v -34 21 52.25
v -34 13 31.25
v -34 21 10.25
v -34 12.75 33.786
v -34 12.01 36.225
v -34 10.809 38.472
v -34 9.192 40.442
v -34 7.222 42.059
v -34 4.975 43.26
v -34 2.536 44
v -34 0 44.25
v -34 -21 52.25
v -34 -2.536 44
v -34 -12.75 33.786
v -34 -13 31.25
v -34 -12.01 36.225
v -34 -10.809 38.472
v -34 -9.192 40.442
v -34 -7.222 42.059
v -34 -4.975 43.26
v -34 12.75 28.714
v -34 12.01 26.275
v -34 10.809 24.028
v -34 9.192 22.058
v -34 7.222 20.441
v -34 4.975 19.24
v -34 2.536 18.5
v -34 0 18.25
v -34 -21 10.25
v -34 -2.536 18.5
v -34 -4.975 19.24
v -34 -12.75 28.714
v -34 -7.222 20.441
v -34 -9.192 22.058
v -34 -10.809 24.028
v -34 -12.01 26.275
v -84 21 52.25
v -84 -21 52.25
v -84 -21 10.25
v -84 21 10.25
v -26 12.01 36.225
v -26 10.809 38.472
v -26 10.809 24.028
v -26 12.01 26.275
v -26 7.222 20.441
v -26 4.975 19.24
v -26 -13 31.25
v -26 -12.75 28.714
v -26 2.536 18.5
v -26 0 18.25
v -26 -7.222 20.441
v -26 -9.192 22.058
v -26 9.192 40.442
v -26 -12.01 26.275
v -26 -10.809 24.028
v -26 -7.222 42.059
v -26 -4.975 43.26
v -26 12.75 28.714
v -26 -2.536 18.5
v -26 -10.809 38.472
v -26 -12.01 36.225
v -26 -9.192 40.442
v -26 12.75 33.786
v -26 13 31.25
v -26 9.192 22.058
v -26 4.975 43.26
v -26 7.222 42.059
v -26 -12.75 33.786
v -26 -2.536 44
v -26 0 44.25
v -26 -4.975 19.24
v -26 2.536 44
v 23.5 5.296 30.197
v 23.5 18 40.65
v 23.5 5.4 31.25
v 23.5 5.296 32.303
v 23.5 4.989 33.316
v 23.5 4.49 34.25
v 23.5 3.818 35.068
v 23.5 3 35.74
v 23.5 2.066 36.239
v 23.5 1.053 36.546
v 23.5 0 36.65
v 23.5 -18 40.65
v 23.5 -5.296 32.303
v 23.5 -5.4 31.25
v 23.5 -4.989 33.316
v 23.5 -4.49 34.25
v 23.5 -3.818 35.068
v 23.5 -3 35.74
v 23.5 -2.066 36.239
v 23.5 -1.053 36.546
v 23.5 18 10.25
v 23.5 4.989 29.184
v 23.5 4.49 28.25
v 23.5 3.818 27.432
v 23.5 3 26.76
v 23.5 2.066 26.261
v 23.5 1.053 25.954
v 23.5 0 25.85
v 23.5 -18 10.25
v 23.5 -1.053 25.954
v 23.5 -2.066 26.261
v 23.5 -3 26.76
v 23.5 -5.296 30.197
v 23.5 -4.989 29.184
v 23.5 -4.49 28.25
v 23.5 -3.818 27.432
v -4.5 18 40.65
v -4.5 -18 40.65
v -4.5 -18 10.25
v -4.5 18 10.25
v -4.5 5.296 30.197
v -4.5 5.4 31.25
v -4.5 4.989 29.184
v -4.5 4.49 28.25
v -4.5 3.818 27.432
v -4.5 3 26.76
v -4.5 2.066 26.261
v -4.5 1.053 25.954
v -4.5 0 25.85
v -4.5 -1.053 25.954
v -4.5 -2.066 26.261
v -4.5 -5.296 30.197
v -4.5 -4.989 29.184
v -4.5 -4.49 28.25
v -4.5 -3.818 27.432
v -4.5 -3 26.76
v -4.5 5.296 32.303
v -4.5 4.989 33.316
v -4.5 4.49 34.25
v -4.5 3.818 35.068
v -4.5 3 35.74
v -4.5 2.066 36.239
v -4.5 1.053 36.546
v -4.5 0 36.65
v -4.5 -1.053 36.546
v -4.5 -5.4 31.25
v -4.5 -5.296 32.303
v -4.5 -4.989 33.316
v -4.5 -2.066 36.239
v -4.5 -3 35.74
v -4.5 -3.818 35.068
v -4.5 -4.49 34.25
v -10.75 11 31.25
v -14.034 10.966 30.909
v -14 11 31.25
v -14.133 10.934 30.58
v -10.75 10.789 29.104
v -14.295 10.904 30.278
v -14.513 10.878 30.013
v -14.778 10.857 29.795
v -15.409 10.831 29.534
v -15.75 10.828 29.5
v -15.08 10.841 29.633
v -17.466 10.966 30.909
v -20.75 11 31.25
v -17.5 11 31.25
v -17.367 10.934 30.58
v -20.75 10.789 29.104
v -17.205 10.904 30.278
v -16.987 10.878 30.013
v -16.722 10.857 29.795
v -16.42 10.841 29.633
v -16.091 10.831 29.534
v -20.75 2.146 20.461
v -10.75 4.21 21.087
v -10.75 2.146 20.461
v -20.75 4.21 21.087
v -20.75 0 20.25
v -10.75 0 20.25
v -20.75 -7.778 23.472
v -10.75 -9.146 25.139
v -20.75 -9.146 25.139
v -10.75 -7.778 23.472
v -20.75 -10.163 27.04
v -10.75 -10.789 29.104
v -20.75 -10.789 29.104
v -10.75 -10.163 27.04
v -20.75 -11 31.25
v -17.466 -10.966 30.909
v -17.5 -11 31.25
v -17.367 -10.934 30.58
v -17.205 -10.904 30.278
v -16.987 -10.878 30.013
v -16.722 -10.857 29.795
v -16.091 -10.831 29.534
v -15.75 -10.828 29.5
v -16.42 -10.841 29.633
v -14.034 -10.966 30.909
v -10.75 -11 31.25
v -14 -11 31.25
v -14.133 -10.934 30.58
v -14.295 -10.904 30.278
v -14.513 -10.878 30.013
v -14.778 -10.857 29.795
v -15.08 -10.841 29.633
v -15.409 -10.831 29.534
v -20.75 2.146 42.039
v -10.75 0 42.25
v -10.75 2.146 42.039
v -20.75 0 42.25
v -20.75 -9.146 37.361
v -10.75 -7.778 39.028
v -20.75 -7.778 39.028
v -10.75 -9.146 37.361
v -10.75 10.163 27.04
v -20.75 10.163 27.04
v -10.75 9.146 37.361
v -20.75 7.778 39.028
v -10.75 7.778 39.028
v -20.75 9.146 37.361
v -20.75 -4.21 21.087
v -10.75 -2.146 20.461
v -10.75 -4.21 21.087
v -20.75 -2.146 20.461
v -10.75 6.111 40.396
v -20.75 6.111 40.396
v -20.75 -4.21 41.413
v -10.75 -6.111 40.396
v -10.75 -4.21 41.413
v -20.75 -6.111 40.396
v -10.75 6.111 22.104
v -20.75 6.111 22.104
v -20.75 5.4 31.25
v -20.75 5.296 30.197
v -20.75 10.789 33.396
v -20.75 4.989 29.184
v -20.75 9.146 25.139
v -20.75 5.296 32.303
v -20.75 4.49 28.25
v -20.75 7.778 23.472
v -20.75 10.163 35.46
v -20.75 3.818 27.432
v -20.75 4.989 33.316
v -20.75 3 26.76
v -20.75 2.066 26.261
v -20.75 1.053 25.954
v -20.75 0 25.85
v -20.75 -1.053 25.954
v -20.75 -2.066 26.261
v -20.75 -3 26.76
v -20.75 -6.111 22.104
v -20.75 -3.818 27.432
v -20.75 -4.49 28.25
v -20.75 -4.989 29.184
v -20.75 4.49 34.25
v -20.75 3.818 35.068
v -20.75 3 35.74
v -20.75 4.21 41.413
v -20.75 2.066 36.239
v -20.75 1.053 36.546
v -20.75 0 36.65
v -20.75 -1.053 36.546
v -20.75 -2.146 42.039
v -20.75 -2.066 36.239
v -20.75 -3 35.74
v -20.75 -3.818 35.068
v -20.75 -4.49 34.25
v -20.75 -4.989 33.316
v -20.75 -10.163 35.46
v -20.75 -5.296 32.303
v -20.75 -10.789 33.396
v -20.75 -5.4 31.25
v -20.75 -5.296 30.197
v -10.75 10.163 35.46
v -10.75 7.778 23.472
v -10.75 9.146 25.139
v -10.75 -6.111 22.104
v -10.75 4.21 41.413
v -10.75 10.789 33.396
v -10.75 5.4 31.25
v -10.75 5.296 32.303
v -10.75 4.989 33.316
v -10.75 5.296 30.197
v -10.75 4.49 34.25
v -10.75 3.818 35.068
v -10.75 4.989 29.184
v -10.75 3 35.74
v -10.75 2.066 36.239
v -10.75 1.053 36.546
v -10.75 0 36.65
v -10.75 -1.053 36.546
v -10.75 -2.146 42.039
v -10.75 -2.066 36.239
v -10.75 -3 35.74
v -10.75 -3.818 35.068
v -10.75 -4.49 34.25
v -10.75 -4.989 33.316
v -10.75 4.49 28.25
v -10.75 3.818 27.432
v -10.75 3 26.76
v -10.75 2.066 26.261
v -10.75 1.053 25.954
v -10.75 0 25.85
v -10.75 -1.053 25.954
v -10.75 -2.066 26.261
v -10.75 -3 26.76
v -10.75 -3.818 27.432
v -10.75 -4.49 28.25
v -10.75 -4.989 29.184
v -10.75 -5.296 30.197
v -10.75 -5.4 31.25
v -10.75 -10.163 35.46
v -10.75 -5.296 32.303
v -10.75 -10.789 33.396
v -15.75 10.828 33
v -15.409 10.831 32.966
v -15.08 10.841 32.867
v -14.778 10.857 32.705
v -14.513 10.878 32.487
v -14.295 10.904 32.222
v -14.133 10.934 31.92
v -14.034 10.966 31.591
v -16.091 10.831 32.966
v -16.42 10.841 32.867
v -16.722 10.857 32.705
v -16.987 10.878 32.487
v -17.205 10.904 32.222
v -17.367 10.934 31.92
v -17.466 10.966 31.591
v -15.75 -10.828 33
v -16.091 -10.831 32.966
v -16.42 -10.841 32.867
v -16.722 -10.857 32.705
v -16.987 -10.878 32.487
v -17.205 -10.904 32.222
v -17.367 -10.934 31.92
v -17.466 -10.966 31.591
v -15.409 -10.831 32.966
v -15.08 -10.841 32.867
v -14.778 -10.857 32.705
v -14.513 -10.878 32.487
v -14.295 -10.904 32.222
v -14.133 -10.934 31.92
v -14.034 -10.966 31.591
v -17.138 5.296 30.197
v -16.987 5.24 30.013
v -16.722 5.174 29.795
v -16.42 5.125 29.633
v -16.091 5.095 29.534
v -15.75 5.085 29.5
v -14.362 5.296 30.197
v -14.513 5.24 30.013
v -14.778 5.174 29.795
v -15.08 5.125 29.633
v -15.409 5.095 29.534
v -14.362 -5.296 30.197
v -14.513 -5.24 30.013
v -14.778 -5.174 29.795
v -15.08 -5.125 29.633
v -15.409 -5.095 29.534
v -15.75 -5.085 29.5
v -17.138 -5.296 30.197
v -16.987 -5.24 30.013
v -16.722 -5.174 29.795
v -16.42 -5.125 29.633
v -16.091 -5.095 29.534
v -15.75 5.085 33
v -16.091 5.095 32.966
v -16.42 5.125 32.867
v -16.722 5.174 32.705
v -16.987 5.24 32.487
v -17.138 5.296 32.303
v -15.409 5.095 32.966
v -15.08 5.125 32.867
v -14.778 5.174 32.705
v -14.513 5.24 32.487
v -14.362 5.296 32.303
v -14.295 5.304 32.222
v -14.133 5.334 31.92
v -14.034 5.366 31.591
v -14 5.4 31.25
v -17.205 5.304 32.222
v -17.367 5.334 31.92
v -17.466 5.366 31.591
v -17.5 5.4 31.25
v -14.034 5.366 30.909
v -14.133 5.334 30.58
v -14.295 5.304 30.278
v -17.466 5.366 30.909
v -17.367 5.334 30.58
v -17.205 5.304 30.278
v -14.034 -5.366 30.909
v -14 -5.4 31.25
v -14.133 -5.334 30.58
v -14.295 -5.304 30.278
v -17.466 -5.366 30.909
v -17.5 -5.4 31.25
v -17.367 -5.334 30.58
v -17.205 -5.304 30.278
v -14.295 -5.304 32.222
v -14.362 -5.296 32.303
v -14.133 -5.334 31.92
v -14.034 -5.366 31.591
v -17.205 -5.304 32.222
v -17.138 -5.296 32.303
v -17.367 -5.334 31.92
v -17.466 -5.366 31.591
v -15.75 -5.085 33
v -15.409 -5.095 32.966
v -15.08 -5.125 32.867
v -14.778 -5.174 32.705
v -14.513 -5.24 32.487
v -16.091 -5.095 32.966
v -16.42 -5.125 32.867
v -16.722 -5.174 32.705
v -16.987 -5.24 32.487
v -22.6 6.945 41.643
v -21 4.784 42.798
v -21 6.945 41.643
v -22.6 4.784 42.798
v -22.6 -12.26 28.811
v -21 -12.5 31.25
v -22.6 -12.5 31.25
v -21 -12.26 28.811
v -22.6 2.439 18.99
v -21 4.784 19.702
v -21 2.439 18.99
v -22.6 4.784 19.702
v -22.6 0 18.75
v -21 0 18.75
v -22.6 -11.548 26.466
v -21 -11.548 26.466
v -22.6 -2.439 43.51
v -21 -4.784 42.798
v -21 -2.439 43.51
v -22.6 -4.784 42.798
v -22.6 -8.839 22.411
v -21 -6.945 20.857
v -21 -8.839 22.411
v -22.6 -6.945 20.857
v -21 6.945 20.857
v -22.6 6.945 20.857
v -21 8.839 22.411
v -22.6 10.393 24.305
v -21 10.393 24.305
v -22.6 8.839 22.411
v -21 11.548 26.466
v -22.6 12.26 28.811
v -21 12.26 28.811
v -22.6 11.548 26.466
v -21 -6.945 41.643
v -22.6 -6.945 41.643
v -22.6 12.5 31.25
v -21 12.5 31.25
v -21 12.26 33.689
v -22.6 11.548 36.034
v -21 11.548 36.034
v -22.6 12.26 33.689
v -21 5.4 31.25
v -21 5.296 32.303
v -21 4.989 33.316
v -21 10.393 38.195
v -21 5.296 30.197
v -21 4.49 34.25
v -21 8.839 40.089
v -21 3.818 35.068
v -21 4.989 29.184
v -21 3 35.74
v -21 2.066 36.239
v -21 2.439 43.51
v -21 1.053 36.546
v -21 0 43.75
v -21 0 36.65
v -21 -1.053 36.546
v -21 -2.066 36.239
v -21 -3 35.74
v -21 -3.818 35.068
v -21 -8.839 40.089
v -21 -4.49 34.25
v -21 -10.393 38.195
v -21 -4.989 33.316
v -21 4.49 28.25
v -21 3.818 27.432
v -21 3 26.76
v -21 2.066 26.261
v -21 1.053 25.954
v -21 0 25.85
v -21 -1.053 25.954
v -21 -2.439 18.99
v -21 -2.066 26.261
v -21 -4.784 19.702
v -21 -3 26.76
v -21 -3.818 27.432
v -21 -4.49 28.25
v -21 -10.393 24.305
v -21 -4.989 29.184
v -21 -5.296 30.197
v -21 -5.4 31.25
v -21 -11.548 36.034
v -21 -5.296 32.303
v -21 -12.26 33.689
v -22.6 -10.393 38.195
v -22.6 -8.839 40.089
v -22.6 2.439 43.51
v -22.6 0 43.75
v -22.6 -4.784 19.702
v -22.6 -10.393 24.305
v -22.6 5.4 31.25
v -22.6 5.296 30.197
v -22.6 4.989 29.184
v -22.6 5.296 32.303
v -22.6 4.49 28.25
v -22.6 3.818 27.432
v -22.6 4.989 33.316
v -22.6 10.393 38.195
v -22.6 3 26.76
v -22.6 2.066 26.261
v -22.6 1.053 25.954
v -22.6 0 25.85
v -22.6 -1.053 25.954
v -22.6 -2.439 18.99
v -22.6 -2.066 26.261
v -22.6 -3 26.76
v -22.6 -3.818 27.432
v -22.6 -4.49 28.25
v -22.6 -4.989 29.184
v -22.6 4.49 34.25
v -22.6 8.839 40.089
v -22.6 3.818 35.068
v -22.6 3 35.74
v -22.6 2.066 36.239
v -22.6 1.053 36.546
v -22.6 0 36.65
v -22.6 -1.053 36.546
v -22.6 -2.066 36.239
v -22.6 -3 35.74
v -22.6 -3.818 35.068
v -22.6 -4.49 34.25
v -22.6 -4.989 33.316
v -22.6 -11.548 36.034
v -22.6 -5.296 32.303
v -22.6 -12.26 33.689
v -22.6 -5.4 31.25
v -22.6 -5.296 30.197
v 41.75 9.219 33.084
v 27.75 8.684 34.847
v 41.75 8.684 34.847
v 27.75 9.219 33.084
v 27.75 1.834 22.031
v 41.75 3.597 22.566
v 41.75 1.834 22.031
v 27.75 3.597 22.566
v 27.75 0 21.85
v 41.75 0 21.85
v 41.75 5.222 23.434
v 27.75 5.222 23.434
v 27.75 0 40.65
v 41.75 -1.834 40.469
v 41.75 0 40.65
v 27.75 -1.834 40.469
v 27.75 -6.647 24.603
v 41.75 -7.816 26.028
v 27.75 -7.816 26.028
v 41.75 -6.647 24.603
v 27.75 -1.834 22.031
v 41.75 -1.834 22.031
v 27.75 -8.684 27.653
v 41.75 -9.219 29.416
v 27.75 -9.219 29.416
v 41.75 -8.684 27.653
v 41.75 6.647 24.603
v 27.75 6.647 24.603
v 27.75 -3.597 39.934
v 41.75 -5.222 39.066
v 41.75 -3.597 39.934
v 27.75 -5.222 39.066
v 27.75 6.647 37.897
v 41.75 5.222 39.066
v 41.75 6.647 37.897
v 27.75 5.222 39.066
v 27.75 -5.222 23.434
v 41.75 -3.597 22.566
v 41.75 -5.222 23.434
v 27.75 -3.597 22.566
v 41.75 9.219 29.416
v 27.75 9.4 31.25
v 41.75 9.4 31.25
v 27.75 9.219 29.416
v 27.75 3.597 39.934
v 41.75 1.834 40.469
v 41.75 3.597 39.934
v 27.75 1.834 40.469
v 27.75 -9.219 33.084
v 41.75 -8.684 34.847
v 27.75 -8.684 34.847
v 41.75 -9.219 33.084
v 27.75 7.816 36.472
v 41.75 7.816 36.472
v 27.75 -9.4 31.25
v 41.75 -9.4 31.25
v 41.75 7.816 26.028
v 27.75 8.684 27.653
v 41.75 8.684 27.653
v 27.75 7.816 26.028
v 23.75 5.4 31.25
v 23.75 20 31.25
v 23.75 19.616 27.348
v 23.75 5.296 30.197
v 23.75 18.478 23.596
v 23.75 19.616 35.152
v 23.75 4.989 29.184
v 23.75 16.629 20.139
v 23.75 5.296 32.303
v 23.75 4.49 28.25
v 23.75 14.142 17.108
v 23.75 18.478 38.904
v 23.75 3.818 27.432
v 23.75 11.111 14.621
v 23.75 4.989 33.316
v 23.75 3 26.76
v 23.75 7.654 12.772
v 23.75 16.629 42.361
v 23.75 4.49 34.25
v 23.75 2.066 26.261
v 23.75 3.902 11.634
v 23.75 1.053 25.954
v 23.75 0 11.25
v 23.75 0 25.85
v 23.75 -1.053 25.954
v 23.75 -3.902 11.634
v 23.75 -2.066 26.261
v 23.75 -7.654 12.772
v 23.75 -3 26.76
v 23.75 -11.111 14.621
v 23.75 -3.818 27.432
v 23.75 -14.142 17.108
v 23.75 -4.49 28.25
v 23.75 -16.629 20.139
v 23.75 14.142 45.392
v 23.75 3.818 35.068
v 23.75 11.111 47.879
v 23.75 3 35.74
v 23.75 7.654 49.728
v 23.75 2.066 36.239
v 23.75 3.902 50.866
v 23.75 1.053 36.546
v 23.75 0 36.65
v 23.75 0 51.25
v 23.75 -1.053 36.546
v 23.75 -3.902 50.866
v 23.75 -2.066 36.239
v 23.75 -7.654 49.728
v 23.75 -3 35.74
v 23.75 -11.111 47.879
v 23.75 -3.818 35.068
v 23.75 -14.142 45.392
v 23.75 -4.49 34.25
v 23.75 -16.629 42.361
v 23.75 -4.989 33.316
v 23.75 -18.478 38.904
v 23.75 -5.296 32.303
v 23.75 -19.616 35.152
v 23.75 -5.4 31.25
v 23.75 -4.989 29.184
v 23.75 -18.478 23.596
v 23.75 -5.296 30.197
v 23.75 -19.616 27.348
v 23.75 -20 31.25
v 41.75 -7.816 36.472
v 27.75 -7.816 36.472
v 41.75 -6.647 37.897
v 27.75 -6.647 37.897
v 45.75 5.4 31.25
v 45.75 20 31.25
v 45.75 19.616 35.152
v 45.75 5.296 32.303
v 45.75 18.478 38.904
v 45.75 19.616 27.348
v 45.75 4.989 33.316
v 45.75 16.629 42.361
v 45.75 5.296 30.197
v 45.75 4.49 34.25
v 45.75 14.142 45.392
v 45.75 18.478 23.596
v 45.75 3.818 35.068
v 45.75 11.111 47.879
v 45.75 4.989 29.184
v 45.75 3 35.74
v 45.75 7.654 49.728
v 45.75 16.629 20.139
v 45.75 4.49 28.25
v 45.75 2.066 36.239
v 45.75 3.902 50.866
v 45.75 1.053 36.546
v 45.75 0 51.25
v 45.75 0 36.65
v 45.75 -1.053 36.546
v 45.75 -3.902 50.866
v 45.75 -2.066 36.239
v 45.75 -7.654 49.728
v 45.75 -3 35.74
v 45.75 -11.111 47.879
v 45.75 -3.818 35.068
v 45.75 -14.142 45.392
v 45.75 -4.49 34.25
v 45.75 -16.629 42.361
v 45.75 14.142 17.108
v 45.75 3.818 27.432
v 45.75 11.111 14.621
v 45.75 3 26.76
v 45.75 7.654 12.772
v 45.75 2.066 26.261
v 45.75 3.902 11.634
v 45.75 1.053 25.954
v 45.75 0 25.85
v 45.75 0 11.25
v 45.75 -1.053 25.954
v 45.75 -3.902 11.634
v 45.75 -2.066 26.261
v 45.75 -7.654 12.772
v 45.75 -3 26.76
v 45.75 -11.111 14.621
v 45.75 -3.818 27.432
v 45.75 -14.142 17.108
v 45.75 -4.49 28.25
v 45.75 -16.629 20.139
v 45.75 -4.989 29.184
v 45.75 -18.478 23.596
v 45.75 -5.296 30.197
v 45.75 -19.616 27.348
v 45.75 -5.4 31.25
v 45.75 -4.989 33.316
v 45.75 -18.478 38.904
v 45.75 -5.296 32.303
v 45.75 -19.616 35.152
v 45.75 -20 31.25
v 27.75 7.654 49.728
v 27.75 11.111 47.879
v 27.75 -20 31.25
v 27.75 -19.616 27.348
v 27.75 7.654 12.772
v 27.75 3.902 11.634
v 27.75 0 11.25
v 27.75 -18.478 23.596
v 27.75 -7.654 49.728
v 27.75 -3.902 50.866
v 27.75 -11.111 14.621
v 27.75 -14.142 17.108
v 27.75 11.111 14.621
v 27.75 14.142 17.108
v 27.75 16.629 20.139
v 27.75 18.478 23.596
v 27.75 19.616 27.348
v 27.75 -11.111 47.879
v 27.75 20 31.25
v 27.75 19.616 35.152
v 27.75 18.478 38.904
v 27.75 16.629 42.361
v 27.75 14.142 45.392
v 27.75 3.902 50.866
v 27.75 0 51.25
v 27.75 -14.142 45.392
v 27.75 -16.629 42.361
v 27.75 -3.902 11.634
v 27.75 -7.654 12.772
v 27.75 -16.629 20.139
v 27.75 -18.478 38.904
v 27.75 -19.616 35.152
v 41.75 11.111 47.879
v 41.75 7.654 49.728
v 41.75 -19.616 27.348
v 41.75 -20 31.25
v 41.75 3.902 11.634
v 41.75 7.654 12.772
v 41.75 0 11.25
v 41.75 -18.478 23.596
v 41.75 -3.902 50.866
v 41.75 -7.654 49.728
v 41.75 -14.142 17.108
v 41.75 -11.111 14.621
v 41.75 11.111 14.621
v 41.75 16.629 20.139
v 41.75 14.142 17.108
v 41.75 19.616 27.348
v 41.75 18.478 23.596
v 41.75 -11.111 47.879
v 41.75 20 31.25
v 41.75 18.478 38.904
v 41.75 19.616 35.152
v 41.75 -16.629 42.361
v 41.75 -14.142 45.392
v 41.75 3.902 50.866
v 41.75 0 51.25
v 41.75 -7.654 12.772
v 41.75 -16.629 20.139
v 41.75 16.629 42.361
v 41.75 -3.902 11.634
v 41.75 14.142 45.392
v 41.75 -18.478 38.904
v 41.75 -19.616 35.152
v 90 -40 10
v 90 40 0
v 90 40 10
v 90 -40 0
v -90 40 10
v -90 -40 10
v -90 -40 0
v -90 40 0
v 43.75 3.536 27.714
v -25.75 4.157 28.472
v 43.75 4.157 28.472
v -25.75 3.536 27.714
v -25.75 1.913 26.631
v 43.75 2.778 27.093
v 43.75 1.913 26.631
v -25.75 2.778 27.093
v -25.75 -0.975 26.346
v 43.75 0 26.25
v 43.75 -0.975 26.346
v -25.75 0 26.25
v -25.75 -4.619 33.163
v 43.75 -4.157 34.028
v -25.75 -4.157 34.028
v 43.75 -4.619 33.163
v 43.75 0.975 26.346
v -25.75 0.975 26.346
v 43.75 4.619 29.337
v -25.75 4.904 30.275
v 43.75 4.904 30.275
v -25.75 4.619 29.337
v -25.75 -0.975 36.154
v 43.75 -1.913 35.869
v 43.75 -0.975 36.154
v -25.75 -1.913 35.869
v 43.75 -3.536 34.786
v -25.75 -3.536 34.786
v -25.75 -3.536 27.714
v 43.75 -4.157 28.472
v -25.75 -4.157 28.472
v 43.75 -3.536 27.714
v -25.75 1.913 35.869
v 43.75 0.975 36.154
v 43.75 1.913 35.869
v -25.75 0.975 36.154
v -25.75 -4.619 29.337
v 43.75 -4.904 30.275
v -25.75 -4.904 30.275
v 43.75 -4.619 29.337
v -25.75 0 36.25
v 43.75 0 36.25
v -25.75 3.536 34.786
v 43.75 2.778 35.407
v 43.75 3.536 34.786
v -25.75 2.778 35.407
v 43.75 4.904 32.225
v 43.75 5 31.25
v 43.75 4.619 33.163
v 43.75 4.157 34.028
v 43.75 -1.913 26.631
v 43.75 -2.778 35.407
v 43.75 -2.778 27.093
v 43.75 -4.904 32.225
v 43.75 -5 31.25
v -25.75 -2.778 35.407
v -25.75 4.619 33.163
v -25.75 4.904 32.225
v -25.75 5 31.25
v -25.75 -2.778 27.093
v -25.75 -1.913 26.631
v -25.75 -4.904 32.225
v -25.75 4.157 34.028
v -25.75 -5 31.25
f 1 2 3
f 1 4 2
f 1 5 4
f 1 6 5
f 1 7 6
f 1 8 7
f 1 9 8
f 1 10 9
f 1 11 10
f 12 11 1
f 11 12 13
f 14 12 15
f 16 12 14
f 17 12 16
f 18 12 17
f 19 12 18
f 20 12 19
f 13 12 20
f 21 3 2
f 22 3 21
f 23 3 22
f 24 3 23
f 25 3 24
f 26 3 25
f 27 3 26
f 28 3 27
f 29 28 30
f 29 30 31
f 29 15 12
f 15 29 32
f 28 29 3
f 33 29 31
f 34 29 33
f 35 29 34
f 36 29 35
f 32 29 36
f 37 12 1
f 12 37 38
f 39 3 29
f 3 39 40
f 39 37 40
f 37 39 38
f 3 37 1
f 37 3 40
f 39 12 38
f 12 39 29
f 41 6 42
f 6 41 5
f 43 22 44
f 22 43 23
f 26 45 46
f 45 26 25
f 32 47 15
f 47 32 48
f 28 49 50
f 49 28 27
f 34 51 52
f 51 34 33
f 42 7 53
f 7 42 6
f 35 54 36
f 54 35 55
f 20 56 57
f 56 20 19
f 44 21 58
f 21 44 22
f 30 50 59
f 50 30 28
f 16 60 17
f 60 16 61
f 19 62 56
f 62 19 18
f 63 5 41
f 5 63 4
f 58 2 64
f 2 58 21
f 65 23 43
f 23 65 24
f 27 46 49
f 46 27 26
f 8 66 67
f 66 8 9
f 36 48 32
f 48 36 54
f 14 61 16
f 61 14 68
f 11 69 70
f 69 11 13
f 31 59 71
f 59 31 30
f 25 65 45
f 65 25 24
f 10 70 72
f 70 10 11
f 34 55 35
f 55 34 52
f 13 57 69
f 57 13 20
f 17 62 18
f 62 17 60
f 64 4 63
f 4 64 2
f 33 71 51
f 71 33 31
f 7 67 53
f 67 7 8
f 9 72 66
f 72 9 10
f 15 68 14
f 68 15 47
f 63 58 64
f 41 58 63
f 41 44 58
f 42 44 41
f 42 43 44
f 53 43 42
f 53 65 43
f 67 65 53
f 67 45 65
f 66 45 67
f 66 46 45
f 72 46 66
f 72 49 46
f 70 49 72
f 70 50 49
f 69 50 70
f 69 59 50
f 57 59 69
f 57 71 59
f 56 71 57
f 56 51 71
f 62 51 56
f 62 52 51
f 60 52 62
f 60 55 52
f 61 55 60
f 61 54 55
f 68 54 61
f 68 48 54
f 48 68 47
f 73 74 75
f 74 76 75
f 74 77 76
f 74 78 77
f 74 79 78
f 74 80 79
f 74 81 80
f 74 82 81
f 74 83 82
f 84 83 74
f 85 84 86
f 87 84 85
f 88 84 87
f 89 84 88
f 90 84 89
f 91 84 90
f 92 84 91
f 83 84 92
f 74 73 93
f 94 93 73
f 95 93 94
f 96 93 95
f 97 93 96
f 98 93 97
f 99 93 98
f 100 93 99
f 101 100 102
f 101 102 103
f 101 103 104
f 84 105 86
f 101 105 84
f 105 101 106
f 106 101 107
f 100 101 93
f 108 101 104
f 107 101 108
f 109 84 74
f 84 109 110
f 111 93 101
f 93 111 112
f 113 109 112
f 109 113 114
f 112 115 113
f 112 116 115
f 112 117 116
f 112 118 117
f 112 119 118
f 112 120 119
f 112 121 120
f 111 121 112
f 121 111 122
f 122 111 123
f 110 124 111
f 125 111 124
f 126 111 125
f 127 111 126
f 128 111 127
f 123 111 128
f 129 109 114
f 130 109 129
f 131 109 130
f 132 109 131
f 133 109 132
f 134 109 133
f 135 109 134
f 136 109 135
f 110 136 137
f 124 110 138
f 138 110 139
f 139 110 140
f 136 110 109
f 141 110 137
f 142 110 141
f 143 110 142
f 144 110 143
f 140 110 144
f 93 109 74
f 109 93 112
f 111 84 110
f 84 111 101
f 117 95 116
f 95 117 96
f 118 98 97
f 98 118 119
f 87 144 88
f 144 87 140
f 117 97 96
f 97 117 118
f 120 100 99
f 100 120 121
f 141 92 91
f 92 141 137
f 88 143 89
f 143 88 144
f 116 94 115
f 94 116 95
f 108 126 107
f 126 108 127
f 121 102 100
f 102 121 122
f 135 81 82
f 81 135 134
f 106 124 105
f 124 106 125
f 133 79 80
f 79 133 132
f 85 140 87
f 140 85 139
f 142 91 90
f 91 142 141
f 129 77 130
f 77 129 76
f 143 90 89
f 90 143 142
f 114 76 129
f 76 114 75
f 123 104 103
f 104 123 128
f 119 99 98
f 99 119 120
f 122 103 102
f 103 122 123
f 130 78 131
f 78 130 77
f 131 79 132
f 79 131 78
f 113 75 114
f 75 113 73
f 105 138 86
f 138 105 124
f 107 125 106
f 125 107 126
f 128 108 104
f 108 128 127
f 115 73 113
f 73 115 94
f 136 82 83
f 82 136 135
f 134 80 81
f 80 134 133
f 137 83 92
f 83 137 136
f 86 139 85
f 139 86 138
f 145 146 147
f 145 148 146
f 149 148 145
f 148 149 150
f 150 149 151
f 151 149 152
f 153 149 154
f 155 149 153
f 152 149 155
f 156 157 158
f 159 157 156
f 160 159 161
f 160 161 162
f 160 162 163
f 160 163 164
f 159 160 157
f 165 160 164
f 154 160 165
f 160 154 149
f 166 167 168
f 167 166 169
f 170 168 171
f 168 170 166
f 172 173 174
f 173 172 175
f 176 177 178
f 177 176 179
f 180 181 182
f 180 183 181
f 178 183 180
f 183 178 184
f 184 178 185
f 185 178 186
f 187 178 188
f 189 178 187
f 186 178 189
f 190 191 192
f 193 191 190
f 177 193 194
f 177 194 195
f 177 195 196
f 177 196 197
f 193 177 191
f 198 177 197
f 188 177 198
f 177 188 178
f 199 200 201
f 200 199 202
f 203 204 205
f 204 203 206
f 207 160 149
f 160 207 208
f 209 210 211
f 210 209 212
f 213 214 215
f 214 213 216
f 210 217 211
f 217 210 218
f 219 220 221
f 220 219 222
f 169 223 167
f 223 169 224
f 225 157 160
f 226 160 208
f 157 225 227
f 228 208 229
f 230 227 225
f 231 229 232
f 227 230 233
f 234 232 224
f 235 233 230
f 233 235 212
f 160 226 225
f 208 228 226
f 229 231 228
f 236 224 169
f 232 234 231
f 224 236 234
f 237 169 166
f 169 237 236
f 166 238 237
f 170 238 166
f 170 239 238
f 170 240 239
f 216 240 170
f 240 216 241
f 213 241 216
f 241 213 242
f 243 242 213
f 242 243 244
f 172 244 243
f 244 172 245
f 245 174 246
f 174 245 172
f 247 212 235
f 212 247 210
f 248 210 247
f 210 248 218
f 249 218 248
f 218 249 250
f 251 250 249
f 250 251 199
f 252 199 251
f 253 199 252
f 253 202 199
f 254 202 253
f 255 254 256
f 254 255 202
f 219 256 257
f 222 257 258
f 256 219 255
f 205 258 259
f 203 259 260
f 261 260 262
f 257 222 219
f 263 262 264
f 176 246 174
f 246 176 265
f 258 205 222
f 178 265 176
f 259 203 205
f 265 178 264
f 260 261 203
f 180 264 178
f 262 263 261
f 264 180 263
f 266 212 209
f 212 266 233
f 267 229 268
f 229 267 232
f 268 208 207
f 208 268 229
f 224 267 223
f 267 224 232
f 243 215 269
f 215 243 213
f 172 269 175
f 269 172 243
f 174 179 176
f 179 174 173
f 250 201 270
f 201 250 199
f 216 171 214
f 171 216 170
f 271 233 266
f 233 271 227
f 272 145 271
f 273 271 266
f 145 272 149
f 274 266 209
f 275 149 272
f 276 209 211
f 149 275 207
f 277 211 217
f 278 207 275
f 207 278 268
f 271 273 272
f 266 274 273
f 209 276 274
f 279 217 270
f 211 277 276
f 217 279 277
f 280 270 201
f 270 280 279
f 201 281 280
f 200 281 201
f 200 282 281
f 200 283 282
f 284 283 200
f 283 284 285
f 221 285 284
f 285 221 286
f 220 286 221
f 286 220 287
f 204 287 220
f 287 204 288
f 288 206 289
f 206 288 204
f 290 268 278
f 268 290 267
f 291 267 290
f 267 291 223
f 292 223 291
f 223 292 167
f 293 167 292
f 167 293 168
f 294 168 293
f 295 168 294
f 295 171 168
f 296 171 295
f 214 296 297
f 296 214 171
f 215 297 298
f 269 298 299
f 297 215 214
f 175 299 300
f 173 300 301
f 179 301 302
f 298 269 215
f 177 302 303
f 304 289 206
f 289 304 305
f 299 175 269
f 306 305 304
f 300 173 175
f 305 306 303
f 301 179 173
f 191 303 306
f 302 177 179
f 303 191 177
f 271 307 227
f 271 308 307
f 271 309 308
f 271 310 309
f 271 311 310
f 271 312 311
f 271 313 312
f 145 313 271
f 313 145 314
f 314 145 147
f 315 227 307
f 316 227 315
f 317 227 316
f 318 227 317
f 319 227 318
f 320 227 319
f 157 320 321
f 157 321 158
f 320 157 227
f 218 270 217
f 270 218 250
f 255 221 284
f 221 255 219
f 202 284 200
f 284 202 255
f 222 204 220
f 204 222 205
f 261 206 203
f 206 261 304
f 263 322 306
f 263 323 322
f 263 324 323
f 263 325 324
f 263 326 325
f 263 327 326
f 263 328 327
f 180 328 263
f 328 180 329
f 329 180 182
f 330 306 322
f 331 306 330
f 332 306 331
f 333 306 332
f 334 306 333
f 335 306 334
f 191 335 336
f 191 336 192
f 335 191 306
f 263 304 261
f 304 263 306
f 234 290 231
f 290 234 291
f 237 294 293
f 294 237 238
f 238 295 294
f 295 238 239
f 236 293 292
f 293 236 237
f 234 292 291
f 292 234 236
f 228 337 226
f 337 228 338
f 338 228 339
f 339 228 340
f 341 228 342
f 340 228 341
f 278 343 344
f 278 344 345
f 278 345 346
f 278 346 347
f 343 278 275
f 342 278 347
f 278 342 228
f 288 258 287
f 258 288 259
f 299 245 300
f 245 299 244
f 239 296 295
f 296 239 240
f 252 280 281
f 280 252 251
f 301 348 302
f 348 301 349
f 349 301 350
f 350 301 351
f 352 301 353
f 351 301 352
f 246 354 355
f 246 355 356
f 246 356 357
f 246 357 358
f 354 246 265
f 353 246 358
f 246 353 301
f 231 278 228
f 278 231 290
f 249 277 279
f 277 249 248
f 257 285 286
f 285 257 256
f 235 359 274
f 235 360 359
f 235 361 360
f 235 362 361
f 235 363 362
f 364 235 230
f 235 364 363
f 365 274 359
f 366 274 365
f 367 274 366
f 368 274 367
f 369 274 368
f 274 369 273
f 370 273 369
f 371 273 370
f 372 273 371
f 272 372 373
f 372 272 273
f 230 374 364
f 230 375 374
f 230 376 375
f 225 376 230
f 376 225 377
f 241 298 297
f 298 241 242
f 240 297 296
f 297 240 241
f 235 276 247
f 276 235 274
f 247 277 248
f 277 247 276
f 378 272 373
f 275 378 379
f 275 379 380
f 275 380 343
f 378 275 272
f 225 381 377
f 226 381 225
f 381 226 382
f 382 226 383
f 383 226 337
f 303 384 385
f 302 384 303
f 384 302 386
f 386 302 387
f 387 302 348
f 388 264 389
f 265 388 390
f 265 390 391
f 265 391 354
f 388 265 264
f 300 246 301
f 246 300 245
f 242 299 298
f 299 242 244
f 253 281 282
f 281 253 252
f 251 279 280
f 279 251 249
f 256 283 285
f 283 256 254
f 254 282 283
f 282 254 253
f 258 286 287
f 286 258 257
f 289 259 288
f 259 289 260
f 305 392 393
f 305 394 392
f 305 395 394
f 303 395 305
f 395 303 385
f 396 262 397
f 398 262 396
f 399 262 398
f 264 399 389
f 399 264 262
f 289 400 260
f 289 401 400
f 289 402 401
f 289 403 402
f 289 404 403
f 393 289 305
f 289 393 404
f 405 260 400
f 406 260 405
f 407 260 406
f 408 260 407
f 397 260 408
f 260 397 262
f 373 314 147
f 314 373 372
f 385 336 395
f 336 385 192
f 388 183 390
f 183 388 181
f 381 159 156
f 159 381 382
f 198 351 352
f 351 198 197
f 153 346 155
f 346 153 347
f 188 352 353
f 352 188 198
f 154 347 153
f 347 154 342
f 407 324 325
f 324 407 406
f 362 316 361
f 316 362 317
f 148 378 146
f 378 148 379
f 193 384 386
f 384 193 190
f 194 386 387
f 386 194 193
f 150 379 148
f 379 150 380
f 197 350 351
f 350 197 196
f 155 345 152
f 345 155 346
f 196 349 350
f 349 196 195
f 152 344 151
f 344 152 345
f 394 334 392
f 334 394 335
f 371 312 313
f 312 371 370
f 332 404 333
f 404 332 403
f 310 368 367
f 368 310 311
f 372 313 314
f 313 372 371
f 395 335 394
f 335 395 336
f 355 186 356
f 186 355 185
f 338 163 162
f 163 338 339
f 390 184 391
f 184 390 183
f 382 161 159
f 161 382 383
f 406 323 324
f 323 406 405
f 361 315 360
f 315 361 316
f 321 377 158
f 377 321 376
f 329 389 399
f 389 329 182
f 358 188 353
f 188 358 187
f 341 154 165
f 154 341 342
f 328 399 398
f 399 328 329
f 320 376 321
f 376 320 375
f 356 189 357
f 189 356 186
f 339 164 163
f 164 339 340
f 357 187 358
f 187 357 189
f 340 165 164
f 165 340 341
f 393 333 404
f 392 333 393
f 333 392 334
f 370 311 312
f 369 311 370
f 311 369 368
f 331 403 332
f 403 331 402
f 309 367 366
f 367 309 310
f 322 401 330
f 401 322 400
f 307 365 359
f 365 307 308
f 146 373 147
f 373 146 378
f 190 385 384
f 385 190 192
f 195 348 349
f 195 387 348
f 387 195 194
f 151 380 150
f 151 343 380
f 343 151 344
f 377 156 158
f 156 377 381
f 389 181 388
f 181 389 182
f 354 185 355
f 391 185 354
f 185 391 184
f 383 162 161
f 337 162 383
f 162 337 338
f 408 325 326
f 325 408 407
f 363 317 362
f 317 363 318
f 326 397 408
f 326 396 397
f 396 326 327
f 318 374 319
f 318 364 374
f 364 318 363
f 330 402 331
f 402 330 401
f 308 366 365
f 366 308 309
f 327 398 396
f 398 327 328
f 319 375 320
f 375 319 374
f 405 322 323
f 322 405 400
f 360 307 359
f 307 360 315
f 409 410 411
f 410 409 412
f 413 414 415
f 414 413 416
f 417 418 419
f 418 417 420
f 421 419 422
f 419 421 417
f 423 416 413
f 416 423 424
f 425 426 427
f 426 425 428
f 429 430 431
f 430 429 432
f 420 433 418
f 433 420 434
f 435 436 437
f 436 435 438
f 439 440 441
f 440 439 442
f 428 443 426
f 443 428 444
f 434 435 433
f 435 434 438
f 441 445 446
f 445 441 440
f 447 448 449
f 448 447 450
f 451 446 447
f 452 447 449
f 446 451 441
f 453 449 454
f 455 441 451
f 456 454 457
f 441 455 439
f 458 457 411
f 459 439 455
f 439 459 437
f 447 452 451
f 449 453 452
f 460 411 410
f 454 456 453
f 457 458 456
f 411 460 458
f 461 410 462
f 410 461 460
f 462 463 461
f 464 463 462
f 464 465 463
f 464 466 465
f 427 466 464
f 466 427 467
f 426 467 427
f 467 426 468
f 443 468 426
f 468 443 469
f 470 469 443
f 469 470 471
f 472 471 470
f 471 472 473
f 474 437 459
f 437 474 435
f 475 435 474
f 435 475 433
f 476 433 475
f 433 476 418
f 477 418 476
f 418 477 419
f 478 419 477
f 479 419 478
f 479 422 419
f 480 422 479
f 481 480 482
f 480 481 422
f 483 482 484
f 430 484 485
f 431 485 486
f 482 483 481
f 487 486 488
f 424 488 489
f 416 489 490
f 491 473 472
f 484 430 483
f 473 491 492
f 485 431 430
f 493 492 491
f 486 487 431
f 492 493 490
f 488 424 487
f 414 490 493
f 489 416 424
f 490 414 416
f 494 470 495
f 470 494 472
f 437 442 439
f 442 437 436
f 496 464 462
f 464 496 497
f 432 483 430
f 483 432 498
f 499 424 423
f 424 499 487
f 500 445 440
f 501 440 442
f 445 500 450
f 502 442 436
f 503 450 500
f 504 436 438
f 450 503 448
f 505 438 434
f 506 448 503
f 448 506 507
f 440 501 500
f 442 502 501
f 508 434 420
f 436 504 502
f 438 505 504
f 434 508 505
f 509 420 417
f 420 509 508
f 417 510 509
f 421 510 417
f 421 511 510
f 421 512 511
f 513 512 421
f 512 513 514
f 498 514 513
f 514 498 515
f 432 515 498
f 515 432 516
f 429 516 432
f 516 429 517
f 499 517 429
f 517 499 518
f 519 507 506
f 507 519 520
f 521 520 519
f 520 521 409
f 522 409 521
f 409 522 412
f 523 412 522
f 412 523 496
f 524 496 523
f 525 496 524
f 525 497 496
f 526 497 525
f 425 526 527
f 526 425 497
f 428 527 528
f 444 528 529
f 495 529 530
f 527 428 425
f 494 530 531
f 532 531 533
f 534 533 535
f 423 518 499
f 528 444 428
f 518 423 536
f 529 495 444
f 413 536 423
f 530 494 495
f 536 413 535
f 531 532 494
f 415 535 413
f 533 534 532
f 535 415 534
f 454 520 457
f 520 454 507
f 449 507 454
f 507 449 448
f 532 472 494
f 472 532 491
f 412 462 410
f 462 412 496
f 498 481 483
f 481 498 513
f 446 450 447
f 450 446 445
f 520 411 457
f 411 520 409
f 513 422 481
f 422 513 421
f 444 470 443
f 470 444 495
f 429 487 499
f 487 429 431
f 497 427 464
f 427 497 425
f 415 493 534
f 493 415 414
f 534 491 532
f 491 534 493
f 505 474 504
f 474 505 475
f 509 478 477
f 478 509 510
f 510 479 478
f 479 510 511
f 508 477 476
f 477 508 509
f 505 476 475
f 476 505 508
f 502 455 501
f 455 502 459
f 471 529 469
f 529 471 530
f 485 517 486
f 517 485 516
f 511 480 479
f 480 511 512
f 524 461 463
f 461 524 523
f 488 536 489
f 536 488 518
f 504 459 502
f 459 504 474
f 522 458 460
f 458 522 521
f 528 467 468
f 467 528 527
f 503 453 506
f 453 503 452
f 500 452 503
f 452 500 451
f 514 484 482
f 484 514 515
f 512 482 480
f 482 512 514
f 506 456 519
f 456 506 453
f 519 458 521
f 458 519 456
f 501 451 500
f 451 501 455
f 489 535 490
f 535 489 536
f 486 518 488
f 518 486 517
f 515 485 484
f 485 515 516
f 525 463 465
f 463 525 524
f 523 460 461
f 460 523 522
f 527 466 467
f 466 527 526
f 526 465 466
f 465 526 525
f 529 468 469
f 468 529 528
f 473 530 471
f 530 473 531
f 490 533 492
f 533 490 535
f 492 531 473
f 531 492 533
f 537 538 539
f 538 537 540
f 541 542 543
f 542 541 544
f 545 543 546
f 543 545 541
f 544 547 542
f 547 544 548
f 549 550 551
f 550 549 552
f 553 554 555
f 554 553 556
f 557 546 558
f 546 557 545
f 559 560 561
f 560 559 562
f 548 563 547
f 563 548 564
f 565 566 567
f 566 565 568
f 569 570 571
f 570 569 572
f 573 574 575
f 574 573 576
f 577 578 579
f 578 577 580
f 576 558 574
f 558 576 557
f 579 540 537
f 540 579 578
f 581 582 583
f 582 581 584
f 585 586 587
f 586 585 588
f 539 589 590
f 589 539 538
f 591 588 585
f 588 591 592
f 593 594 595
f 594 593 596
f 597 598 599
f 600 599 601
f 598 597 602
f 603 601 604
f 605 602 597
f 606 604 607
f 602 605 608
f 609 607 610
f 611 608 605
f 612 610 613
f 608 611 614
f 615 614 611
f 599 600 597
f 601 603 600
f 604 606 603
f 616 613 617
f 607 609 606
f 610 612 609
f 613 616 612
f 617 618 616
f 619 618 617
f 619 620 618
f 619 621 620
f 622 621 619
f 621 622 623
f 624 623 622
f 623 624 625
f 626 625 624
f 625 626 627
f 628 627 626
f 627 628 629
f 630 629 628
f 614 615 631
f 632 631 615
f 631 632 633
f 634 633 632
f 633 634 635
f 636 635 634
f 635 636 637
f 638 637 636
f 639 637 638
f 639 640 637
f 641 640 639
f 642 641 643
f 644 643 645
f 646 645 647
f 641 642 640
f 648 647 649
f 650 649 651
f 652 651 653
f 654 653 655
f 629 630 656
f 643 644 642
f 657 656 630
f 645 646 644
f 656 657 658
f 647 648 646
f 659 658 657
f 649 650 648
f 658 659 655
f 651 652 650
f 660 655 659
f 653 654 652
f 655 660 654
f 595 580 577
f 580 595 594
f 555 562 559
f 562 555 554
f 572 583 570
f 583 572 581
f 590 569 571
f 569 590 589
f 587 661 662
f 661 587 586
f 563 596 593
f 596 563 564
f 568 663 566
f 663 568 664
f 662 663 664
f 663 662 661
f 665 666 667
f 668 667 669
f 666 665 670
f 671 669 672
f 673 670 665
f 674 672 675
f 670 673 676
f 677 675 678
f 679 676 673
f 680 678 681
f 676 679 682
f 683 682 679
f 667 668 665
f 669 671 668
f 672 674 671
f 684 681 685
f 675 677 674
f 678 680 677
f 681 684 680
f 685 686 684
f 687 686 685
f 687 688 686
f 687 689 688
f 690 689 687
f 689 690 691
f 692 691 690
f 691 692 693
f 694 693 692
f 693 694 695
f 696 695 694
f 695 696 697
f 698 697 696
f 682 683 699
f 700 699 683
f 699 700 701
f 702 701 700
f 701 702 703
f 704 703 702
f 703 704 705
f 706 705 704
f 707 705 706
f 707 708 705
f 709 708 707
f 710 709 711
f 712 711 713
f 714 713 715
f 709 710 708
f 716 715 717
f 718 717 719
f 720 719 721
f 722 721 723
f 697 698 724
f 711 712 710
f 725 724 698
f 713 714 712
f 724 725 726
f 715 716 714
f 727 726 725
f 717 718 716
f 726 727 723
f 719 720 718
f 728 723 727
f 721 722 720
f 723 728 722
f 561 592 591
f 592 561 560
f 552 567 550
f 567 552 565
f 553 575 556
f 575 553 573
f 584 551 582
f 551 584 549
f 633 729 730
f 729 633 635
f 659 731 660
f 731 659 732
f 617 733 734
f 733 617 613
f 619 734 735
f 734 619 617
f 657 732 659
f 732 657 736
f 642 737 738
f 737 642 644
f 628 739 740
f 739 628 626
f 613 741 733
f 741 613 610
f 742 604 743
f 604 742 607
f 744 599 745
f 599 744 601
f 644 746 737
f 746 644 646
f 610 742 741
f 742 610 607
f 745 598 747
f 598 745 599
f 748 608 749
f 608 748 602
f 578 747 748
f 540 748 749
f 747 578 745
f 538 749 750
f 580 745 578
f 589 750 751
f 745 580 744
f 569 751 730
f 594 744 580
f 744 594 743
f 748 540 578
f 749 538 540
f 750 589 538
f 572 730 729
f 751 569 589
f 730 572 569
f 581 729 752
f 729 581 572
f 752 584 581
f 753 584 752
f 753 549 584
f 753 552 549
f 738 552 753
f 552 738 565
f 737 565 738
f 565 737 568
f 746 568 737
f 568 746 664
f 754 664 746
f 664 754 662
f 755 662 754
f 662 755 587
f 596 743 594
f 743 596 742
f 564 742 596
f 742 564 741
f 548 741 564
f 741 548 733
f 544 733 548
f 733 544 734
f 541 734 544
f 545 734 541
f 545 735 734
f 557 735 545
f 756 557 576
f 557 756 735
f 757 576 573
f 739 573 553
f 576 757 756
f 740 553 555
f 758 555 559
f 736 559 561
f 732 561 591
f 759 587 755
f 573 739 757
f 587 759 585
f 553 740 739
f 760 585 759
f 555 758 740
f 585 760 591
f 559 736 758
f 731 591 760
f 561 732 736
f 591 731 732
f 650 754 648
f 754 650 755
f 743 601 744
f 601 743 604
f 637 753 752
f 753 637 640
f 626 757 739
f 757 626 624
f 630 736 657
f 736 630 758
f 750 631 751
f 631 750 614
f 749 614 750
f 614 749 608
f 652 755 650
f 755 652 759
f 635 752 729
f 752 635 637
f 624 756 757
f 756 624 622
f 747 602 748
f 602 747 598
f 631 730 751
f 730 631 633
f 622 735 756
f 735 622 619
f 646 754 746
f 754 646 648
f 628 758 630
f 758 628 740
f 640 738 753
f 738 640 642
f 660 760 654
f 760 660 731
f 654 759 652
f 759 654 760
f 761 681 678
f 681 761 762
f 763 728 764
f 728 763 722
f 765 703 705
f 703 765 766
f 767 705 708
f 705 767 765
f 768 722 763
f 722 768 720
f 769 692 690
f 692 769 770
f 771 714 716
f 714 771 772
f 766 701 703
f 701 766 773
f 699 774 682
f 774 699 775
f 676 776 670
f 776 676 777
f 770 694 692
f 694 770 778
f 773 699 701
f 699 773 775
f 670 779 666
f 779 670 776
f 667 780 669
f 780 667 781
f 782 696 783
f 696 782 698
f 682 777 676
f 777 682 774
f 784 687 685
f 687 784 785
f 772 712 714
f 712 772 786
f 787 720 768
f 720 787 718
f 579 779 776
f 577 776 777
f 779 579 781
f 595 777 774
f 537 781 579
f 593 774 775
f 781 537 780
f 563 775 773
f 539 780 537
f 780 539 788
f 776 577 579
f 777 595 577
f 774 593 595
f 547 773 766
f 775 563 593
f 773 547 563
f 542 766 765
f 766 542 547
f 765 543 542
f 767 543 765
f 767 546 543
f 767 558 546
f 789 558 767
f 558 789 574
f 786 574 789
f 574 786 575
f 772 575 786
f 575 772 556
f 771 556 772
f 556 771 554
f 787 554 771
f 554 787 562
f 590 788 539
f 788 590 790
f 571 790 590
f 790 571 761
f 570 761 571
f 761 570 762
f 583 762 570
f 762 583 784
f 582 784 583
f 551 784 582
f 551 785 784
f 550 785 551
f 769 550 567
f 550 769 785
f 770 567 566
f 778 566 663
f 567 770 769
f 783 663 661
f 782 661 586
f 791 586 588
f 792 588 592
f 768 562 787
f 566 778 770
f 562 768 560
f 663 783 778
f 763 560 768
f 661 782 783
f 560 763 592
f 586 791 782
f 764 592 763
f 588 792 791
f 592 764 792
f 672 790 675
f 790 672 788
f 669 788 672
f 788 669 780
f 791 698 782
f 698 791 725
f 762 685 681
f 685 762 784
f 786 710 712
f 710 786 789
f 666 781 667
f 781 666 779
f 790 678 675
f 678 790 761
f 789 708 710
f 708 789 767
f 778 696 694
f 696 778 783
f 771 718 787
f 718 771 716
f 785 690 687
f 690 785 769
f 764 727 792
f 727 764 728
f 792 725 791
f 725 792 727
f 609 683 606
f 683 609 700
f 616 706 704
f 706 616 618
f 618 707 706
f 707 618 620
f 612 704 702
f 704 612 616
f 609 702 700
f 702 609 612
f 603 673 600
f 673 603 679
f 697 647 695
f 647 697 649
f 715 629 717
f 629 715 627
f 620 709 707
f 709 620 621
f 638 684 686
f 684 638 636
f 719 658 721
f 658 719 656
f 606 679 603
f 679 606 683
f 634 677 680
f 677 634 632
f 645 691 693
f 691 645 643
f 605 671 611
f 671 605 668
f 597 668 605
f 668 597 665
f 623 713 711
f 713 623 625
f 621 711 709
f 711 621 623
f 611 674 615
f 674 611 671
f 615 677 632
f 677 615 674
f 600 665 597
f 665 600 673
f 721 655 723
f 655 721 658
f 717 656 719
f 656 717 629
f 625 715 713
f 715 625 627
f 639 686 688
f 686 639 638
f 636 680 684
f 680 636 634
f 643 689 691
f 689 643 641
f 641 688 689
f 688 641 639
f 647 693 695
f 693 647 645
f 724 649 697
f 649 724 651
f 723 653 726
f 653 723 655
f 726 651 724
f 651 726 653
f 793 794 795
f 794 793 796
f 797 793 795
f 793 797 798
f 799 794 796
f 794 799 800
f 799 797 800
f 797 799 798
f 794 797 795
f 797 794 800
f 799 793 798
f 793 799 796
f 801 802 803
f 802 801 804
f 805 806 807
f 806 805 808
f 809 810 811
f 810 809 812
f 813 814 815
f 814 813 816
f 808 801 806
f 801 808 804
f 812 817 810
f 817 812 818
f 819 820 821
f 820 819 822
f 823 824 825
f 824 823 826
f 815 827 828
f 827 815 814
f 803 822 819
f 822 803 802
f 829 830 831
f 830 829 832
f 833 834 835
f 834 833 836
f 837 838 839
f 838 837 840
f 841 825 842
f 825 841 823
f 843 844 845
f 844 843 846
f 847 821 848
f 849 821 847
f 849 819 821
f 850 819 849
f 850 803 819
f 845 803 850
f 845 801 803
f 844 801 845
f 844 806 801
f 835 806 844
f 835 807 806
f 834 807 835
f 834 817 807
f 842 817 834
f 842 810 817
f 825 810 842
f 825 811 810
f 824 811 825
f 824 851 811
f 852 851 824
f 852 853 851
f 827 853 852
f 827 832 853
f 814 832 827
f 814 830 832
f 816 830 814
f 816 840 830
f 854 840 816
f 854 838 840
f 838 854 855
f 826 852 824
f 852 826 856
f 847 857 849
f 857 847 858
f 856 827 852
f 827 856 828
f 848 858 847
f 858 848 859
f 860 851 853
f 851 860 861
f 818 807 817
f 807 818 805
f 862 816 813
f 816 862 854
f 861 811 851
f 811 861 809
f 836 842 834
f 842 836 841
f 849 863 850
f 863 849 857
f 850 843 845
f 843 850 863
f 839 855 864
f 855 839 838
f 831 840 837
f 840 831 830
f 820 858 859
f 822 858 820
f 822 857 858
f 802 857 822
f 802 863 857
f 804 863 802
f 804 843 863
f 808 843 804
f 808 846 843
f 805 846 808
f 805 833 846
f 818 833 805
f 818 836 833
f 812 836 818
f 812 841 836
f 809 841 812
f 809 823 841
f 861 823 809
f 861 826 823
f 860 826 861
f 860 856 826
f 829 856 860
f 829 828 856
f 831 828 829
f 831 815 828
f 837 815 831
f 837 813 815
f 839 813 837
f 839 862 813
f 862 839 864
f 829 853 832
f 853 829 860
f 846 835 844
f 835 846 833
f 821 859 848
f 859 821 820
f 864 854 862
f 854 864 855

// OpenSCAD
$fn = 32;

// ------------------------------------------------------------------------
// Motor drive station: motor 50 x 42 mm, shaft d10, pulley d40
// Every part is its own module, assembly() places every instance.
// ------------------------------------------------------------------------

// --- part 1 ---
module station_bed() {
  difference() {
    translate([-90, -40, 0]) cube([180, 80, 10]);
  }
}

// --- part 2 ---
module drive_motor() {
  union() {
    translate([-25, -21, 0]) cube([50, 42, 42]);
    translate([29, 0, 21]) rotate([0, 90, 0]) cylinder(h = 8, d = 26, center = true);
  }
}

// --- part 3 ---
module pillow_block() {
  difference() {
    translate([-14, -18, 0]) cube([28, 36, 30.4]);
    translate([0, 0, 21]) rotate([0, 90, 0]) cylinder(h = 30, d = 10.8, center = true);
  }
}

// --- part 4 ---
module drive_shaft() {
  translate([0, 0, -34.75]) cylinder(h = 69.5, d = 10);
}

// --- part 5 ---
module shaft_collar() {
  difference() {
    cylinder(h = 10, d = 22);
    translate([0, 0, -1]) cylinder(h = 12, d = 10.8);
    translate([0, 0, 5]) rotate([90, 0, 0]) cylinder(h = 24, d = 3.5, center = true);
  }
}

// --- part 6 ---
module collar_washer() {
  difference() {
      translate([0, 0, 0]) cylinder(h = 1.6, d = 25);
      translate([0, 0, -1]) cylinder(h = 3.6, d = 10.8);
    }
}

// --- part 7 ---
module drive_pulley() {
  difference() {
    union() {
      cylinder(h = 22, d = 18.8);
      cylinder(h = 4, d = 40);
      translate([0, 0, 18]) cylinder(h = 4, d = 40);
    }
    translate([0, 0, -1]) cylinder(h = 24, d = 10.8);
  }
}

// --- assembly ---
module assembly() {
  color([0.80, 0.24, 0.20]) translate([0, 0, 0]) rotate([0, 0, 0]) station_bed();
  color([0.20, 0.45, 0.75]) translate([-59, 0, 10.25]) rotate([0, 0, 0]) drive_motor();
  color([0.25, 0.62, 0.32]) translate([9.5, 0, 10.25]) rotate([0, 0, 0]) pillow_block();
  color([0.92, 0.70, 0.18]) translate([9, 0, 31.25]) rotate([0, 90, 0]) drive_shaft();
  color([0.58, 0.35, 0.70]) translate([-20.75, 0, 31.25]) rotate([0, 90, 0]) shaft_collar();
  color([0.16, 0.66, 0.66]) translate([-22.6, 0, 31.25]) rotate([0, 90, 0]) collar_washer();
  color([0.85, 0.48, 0.18]) translate([23.75, 0, 31.25]) rotate([0, 90, 0]) drive_pulley();
}

assembly();
